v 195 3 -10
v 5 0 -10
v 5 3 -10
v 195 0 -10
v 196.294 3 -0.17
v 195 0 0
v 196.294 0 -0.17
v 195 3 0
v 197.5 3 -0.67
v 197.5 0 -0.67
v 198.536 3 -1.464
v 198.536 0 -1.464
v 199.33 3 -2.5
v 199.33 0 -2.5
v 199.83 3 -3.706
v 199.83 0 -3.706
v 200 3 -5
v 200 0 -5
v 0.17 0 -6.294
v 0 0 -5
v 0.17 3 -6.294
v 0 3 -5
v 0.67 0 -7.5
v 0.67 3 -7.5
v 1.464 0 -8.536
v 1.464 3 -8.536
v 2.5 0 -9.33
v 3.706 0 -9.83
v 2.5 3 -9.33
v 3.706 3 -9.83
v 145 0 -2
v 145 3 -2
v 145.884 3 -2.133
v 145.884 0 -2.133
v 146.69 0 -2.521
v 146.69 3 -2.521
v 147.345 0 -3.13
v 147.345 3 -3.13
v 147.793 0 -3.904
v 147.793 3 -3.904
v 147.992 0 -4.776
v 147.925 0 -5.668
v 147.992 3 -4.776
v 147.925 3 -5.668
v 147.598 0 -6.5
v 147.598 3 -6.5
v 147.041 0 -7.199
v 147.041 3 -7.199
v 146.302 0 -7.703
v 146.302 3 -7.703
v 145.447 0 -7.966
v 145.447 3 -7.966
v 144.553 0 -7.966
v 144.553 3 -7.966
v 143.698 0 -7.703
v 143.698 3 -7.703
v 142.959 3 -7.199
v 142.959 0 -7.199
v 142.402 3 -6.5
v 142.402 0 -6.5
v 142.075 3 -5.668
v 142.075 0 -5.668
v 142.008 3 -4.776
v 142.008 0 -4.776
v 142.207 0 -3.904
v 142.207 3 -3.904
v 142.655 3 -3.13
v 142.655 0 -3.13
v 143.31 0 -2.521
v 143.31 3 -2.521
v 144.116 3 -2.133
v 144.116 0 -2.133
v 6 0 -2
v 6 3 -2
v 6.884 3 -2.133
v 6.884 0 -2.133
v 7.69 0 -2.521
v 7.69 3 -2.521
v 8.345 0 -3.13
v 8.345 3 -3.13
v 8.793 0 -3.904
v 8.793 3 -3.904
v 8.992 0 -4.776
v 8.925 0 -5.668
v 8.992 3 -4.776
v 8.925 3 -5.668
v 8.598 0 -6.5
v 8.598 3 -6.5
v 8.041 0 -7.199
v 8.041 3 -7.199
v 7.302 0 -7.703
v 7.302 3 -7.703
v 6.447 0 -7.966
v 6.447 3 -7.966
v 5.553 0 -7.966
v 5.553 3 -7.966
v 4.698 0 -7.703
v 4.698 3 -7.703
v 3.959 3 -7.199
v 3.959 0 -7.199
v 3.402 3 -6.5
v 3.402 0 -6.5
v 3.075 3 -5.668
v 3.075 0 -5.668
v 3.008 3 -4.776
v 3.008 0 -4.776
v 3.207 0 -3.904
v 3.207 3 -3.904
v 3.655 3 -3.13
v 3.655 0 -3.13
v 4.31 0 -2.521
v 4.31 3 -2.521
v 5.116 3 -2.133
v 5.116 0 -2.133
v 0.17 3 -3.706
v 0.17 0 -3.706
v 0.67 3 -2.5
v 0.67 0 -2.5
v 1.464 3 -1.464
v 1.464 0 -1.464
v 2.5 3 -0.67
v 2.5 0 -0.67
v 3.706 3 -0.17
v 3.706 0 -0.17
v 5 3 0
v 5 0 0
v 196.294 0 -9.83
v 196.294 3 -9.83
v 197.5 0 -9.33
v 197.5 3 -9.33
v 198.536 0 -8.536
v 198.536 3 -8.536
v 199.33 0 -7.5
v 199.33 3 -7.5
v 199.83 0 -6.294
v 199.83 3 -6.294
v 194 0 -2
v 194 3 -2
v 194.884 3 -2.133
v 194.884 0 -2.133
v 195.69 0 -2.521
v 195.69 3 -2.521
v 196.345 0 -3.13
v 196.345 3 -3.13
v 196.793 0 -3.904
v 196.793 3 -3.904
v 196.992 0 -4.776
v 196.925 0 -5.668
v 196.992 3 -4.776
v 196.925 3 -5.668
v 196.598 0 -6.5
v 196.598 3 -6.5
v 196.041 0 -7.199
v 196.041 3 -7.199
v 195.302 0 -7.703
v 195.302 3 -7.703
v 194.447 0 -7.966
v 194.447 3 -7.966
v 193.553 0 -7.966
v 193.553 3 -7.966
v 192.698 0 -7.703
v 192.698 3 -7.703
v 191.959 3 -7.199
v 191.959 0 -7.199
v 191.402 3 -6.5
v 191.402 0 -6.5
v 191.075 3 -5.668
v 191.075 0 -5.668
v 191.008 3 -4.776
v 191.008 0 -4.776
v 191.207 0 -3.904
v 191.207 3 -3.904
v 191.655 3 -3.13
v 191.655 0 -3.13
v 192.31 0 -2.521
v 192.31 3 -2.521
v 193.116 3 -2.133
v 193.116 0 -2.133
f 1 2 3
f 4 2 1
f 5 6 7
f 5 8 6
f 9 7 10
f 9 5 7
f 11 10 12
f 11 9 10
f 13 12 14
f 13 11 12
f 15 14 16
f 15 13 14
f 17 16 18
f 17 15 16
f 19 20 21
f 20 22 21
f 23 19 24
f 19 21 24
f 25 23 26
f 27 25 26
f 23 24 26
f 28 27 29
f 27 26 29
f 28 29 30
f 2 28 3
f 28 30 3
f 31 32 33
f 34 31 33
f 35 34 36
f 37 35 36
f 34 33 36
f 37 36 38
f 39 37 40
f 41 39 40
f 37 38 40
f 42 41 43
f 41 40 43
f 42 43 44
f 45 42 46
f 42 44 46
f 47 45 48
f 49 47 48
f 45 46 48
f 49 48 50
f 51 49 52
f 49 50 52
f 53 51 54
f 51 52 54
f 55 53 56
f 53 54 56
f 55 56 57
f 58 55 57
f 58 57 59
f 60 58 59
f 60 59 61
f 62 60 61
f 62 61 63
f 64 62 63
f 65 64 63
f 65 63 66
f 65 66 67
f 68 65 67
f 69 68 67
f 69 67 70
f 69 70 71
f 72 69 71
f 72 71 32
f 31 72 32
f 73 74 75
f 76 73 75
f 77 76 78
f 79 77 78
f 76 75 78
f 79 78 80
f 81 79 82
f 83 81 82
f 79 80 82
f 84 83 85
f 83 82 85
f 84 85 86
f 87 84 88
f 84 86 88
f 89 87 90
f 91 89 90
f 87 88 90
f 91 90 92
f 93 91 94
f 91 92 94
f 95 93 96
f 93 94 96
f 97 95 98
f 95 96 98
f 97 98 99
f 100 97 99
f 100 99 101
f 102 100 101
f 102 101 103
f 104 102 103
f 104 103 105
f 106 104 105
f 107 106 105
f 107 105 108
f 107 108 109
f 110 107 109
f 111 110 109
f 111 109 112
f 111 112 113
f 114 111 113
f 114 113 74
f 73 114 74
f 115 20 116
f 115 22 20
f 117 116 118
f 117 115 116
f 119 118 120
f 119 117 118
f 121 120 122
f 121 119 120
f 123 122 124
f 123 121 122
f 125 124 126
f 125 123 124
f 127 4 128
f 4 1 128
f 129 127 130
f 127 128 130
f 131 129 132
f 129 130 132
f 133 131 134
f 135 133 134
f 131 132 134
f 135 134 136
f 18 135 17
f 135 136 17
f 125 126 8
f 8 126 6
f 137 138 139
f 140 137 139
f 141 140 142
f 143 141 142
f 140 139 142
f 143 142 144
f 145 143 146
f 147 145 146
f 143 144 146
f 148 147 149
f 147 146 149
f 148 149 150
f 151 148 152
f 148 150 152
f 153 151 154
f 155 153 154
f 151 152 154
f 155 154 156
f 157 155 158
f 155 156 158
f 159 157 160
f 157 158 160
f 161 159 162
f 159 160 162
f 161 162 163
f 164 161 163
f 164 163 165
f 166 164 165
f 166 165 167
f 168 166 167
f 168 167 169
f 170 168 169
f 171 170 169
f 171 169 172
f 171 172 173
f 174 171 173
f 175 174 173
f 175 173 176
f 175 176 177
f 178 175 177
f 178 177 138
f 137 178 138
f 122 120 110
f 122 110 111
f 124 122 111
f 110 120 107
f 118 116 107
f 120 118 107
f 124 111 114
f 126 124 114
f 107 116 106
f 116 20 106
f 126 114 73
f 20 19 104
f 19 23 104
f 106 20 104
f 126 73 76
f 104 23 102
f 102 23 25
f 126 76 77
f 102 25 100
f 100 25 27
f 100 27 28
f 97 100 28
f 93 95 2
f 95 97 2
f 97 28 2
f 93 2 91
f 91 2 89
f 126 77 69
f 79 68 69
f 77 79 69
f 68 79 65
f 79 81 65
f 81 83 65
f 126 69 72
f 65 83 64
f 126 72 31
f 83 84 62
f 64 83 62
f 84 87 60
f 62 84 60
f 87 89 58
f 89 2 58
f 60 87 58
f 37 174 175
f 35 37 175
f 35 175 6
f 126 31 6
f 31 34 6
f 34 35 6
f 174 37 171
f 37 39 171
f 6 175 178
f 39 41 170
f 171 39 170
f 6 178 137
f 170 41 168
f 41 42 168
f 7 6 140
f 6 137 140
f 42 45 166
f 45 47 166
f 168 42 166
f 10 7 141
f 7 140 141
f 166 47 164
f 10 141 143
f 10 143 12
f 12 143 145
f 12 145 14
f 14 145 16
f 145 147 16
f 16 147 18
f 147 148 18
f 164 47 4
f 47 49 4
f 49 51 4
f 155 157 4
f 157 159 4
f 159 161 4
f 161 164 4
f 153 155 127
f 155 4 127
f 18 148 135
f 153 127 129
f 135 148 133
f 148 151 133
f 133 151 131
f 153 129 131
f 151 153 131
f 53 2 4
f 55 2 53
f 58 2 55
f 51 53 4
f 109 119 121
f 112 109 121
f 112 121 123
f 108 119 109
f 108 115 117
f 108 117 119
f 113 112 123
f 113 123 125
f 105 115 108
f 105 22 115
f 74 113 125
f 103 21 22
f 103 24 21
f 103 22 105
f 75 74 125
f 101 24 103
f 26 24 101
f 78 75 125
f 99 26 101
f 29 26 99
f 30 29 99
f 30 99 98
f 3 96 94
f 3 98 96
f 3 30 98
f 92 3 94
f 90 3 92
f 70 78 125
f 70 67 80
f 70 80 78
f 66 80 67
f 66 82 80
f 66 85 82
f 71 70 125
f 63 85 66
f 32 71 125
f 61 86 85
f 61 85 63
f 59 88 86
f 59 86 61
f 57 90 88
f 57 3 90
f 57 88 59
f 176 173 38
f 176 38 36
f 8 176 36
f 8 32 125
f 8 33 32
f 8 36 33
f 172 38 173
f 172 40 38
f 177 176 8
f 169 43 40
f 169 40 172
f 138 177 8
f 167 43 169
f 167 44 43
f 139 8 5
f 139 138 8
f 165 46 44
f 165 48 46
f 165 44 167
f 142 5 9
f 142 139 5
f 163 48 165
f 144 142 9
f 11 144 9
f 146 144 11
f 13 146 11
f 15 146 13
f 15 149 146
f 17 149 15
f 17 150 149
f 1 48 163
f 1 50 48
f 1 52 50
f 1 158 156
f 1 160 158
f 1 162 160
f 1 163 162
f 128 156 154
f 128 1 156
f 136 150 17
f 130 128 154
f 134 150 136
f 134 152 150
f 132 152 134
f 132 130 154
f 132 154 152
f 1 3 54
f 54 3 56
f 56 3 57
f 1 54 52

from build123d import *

# Parameters (mm, degrees)
SKETCH2_W           = 200
SKETCH2_H           = 10
BOSS_EXTRUDE1_DEPTH = 3
SKETCH3_R           = 3
CUT_EXTRUDE1_DEPTH  = 201.272314612
SKETCH4_R           = 3
CUT_EXTRUDE2_DEPTH  = 201.272314612
FILLET1_R           = 5
FILLET2_R           = 5
SKETCH5_R           = 3
CUT_EXTRUDE3_DEPTH  = 201.272314612


with BuildPart() as part:
    # Sketch2 → Boss-Extrude1 (new body)
    with BuildSketch(Plane(origin=(0, 0, 0), x_dir=(1, 0, 0), z_dir=(0, 1, 0))):
        with Locations((100, 5)):
            Rectangle(SKETCH2_W, SKETCH2_H)
    extrude(amount=BOSS_EXTRUDE1_DEPTH)

    # Sketch3 → Cut-Extrude1 (cut, through all)
    with BuildSketch(Plane(origin=(0, 3, 0), x_dir=(1, 0, 0), z_dir=(0, 1, 0))):
        with Locations(Location((6, 5, 0), (0, 0, 270))):
            Circle(SKETCH3_R)
    extrude(amount=-CUT_EXTRUDE1_DEPTH, mode=Mode.SUBTRACT)

    # Sketch4 → Cut-Extrude2 (cut, through all)
    with BuildSketch(Plane(origin=(0, 3, 0), x_dir=(1, 0, 0), z_dir=(0, 1, 0))):
        with Locations(Location((194, 5, 0), (0, 0, 270))):
            Circle(SKETCH4_R)
    extrude(amount=-CUT_EXTRUDE2_DEPTH, mode=Mode.SUBTRACT)

    # Fillet1
    fillet1_edges = [part.edges().sort_by_distance(p)[0] for p in [
        (0, 1.5, -10),
        (0, 1.5, 0),
    ]]
    fillet(fillet1_edges, radius=FILLET1_R - 0.0001)  # a hair under: the kernel refuses the full size

    # Fillet2
    fillet2_edges = [part.edges().sort_by_distance(p)[0] for p in [
        (200, 1.5, -10),
        (200, 1.5, 0),
    ]]
    fillet(fillet2_edges, radius=FILLET2_R - 0.0001)  # a hair under: the kernel refuses the full size

    # Sketch5 → Cut-Extrude3 (cut, through all)
    with BuildSketch(Plane(origin=(0, 3, 0), x_dir=(1, 0, 0), z_dir=(0, 1, 0))):
        with Locations(Location((145, 5, 0), (0, 0, 270))):
            Circle(SKETCH5_R)
    extrude(amount=-CUT_EXTRUDE3_DEPTH, mode=Mode.SUBTRACT)


solid = part.part
